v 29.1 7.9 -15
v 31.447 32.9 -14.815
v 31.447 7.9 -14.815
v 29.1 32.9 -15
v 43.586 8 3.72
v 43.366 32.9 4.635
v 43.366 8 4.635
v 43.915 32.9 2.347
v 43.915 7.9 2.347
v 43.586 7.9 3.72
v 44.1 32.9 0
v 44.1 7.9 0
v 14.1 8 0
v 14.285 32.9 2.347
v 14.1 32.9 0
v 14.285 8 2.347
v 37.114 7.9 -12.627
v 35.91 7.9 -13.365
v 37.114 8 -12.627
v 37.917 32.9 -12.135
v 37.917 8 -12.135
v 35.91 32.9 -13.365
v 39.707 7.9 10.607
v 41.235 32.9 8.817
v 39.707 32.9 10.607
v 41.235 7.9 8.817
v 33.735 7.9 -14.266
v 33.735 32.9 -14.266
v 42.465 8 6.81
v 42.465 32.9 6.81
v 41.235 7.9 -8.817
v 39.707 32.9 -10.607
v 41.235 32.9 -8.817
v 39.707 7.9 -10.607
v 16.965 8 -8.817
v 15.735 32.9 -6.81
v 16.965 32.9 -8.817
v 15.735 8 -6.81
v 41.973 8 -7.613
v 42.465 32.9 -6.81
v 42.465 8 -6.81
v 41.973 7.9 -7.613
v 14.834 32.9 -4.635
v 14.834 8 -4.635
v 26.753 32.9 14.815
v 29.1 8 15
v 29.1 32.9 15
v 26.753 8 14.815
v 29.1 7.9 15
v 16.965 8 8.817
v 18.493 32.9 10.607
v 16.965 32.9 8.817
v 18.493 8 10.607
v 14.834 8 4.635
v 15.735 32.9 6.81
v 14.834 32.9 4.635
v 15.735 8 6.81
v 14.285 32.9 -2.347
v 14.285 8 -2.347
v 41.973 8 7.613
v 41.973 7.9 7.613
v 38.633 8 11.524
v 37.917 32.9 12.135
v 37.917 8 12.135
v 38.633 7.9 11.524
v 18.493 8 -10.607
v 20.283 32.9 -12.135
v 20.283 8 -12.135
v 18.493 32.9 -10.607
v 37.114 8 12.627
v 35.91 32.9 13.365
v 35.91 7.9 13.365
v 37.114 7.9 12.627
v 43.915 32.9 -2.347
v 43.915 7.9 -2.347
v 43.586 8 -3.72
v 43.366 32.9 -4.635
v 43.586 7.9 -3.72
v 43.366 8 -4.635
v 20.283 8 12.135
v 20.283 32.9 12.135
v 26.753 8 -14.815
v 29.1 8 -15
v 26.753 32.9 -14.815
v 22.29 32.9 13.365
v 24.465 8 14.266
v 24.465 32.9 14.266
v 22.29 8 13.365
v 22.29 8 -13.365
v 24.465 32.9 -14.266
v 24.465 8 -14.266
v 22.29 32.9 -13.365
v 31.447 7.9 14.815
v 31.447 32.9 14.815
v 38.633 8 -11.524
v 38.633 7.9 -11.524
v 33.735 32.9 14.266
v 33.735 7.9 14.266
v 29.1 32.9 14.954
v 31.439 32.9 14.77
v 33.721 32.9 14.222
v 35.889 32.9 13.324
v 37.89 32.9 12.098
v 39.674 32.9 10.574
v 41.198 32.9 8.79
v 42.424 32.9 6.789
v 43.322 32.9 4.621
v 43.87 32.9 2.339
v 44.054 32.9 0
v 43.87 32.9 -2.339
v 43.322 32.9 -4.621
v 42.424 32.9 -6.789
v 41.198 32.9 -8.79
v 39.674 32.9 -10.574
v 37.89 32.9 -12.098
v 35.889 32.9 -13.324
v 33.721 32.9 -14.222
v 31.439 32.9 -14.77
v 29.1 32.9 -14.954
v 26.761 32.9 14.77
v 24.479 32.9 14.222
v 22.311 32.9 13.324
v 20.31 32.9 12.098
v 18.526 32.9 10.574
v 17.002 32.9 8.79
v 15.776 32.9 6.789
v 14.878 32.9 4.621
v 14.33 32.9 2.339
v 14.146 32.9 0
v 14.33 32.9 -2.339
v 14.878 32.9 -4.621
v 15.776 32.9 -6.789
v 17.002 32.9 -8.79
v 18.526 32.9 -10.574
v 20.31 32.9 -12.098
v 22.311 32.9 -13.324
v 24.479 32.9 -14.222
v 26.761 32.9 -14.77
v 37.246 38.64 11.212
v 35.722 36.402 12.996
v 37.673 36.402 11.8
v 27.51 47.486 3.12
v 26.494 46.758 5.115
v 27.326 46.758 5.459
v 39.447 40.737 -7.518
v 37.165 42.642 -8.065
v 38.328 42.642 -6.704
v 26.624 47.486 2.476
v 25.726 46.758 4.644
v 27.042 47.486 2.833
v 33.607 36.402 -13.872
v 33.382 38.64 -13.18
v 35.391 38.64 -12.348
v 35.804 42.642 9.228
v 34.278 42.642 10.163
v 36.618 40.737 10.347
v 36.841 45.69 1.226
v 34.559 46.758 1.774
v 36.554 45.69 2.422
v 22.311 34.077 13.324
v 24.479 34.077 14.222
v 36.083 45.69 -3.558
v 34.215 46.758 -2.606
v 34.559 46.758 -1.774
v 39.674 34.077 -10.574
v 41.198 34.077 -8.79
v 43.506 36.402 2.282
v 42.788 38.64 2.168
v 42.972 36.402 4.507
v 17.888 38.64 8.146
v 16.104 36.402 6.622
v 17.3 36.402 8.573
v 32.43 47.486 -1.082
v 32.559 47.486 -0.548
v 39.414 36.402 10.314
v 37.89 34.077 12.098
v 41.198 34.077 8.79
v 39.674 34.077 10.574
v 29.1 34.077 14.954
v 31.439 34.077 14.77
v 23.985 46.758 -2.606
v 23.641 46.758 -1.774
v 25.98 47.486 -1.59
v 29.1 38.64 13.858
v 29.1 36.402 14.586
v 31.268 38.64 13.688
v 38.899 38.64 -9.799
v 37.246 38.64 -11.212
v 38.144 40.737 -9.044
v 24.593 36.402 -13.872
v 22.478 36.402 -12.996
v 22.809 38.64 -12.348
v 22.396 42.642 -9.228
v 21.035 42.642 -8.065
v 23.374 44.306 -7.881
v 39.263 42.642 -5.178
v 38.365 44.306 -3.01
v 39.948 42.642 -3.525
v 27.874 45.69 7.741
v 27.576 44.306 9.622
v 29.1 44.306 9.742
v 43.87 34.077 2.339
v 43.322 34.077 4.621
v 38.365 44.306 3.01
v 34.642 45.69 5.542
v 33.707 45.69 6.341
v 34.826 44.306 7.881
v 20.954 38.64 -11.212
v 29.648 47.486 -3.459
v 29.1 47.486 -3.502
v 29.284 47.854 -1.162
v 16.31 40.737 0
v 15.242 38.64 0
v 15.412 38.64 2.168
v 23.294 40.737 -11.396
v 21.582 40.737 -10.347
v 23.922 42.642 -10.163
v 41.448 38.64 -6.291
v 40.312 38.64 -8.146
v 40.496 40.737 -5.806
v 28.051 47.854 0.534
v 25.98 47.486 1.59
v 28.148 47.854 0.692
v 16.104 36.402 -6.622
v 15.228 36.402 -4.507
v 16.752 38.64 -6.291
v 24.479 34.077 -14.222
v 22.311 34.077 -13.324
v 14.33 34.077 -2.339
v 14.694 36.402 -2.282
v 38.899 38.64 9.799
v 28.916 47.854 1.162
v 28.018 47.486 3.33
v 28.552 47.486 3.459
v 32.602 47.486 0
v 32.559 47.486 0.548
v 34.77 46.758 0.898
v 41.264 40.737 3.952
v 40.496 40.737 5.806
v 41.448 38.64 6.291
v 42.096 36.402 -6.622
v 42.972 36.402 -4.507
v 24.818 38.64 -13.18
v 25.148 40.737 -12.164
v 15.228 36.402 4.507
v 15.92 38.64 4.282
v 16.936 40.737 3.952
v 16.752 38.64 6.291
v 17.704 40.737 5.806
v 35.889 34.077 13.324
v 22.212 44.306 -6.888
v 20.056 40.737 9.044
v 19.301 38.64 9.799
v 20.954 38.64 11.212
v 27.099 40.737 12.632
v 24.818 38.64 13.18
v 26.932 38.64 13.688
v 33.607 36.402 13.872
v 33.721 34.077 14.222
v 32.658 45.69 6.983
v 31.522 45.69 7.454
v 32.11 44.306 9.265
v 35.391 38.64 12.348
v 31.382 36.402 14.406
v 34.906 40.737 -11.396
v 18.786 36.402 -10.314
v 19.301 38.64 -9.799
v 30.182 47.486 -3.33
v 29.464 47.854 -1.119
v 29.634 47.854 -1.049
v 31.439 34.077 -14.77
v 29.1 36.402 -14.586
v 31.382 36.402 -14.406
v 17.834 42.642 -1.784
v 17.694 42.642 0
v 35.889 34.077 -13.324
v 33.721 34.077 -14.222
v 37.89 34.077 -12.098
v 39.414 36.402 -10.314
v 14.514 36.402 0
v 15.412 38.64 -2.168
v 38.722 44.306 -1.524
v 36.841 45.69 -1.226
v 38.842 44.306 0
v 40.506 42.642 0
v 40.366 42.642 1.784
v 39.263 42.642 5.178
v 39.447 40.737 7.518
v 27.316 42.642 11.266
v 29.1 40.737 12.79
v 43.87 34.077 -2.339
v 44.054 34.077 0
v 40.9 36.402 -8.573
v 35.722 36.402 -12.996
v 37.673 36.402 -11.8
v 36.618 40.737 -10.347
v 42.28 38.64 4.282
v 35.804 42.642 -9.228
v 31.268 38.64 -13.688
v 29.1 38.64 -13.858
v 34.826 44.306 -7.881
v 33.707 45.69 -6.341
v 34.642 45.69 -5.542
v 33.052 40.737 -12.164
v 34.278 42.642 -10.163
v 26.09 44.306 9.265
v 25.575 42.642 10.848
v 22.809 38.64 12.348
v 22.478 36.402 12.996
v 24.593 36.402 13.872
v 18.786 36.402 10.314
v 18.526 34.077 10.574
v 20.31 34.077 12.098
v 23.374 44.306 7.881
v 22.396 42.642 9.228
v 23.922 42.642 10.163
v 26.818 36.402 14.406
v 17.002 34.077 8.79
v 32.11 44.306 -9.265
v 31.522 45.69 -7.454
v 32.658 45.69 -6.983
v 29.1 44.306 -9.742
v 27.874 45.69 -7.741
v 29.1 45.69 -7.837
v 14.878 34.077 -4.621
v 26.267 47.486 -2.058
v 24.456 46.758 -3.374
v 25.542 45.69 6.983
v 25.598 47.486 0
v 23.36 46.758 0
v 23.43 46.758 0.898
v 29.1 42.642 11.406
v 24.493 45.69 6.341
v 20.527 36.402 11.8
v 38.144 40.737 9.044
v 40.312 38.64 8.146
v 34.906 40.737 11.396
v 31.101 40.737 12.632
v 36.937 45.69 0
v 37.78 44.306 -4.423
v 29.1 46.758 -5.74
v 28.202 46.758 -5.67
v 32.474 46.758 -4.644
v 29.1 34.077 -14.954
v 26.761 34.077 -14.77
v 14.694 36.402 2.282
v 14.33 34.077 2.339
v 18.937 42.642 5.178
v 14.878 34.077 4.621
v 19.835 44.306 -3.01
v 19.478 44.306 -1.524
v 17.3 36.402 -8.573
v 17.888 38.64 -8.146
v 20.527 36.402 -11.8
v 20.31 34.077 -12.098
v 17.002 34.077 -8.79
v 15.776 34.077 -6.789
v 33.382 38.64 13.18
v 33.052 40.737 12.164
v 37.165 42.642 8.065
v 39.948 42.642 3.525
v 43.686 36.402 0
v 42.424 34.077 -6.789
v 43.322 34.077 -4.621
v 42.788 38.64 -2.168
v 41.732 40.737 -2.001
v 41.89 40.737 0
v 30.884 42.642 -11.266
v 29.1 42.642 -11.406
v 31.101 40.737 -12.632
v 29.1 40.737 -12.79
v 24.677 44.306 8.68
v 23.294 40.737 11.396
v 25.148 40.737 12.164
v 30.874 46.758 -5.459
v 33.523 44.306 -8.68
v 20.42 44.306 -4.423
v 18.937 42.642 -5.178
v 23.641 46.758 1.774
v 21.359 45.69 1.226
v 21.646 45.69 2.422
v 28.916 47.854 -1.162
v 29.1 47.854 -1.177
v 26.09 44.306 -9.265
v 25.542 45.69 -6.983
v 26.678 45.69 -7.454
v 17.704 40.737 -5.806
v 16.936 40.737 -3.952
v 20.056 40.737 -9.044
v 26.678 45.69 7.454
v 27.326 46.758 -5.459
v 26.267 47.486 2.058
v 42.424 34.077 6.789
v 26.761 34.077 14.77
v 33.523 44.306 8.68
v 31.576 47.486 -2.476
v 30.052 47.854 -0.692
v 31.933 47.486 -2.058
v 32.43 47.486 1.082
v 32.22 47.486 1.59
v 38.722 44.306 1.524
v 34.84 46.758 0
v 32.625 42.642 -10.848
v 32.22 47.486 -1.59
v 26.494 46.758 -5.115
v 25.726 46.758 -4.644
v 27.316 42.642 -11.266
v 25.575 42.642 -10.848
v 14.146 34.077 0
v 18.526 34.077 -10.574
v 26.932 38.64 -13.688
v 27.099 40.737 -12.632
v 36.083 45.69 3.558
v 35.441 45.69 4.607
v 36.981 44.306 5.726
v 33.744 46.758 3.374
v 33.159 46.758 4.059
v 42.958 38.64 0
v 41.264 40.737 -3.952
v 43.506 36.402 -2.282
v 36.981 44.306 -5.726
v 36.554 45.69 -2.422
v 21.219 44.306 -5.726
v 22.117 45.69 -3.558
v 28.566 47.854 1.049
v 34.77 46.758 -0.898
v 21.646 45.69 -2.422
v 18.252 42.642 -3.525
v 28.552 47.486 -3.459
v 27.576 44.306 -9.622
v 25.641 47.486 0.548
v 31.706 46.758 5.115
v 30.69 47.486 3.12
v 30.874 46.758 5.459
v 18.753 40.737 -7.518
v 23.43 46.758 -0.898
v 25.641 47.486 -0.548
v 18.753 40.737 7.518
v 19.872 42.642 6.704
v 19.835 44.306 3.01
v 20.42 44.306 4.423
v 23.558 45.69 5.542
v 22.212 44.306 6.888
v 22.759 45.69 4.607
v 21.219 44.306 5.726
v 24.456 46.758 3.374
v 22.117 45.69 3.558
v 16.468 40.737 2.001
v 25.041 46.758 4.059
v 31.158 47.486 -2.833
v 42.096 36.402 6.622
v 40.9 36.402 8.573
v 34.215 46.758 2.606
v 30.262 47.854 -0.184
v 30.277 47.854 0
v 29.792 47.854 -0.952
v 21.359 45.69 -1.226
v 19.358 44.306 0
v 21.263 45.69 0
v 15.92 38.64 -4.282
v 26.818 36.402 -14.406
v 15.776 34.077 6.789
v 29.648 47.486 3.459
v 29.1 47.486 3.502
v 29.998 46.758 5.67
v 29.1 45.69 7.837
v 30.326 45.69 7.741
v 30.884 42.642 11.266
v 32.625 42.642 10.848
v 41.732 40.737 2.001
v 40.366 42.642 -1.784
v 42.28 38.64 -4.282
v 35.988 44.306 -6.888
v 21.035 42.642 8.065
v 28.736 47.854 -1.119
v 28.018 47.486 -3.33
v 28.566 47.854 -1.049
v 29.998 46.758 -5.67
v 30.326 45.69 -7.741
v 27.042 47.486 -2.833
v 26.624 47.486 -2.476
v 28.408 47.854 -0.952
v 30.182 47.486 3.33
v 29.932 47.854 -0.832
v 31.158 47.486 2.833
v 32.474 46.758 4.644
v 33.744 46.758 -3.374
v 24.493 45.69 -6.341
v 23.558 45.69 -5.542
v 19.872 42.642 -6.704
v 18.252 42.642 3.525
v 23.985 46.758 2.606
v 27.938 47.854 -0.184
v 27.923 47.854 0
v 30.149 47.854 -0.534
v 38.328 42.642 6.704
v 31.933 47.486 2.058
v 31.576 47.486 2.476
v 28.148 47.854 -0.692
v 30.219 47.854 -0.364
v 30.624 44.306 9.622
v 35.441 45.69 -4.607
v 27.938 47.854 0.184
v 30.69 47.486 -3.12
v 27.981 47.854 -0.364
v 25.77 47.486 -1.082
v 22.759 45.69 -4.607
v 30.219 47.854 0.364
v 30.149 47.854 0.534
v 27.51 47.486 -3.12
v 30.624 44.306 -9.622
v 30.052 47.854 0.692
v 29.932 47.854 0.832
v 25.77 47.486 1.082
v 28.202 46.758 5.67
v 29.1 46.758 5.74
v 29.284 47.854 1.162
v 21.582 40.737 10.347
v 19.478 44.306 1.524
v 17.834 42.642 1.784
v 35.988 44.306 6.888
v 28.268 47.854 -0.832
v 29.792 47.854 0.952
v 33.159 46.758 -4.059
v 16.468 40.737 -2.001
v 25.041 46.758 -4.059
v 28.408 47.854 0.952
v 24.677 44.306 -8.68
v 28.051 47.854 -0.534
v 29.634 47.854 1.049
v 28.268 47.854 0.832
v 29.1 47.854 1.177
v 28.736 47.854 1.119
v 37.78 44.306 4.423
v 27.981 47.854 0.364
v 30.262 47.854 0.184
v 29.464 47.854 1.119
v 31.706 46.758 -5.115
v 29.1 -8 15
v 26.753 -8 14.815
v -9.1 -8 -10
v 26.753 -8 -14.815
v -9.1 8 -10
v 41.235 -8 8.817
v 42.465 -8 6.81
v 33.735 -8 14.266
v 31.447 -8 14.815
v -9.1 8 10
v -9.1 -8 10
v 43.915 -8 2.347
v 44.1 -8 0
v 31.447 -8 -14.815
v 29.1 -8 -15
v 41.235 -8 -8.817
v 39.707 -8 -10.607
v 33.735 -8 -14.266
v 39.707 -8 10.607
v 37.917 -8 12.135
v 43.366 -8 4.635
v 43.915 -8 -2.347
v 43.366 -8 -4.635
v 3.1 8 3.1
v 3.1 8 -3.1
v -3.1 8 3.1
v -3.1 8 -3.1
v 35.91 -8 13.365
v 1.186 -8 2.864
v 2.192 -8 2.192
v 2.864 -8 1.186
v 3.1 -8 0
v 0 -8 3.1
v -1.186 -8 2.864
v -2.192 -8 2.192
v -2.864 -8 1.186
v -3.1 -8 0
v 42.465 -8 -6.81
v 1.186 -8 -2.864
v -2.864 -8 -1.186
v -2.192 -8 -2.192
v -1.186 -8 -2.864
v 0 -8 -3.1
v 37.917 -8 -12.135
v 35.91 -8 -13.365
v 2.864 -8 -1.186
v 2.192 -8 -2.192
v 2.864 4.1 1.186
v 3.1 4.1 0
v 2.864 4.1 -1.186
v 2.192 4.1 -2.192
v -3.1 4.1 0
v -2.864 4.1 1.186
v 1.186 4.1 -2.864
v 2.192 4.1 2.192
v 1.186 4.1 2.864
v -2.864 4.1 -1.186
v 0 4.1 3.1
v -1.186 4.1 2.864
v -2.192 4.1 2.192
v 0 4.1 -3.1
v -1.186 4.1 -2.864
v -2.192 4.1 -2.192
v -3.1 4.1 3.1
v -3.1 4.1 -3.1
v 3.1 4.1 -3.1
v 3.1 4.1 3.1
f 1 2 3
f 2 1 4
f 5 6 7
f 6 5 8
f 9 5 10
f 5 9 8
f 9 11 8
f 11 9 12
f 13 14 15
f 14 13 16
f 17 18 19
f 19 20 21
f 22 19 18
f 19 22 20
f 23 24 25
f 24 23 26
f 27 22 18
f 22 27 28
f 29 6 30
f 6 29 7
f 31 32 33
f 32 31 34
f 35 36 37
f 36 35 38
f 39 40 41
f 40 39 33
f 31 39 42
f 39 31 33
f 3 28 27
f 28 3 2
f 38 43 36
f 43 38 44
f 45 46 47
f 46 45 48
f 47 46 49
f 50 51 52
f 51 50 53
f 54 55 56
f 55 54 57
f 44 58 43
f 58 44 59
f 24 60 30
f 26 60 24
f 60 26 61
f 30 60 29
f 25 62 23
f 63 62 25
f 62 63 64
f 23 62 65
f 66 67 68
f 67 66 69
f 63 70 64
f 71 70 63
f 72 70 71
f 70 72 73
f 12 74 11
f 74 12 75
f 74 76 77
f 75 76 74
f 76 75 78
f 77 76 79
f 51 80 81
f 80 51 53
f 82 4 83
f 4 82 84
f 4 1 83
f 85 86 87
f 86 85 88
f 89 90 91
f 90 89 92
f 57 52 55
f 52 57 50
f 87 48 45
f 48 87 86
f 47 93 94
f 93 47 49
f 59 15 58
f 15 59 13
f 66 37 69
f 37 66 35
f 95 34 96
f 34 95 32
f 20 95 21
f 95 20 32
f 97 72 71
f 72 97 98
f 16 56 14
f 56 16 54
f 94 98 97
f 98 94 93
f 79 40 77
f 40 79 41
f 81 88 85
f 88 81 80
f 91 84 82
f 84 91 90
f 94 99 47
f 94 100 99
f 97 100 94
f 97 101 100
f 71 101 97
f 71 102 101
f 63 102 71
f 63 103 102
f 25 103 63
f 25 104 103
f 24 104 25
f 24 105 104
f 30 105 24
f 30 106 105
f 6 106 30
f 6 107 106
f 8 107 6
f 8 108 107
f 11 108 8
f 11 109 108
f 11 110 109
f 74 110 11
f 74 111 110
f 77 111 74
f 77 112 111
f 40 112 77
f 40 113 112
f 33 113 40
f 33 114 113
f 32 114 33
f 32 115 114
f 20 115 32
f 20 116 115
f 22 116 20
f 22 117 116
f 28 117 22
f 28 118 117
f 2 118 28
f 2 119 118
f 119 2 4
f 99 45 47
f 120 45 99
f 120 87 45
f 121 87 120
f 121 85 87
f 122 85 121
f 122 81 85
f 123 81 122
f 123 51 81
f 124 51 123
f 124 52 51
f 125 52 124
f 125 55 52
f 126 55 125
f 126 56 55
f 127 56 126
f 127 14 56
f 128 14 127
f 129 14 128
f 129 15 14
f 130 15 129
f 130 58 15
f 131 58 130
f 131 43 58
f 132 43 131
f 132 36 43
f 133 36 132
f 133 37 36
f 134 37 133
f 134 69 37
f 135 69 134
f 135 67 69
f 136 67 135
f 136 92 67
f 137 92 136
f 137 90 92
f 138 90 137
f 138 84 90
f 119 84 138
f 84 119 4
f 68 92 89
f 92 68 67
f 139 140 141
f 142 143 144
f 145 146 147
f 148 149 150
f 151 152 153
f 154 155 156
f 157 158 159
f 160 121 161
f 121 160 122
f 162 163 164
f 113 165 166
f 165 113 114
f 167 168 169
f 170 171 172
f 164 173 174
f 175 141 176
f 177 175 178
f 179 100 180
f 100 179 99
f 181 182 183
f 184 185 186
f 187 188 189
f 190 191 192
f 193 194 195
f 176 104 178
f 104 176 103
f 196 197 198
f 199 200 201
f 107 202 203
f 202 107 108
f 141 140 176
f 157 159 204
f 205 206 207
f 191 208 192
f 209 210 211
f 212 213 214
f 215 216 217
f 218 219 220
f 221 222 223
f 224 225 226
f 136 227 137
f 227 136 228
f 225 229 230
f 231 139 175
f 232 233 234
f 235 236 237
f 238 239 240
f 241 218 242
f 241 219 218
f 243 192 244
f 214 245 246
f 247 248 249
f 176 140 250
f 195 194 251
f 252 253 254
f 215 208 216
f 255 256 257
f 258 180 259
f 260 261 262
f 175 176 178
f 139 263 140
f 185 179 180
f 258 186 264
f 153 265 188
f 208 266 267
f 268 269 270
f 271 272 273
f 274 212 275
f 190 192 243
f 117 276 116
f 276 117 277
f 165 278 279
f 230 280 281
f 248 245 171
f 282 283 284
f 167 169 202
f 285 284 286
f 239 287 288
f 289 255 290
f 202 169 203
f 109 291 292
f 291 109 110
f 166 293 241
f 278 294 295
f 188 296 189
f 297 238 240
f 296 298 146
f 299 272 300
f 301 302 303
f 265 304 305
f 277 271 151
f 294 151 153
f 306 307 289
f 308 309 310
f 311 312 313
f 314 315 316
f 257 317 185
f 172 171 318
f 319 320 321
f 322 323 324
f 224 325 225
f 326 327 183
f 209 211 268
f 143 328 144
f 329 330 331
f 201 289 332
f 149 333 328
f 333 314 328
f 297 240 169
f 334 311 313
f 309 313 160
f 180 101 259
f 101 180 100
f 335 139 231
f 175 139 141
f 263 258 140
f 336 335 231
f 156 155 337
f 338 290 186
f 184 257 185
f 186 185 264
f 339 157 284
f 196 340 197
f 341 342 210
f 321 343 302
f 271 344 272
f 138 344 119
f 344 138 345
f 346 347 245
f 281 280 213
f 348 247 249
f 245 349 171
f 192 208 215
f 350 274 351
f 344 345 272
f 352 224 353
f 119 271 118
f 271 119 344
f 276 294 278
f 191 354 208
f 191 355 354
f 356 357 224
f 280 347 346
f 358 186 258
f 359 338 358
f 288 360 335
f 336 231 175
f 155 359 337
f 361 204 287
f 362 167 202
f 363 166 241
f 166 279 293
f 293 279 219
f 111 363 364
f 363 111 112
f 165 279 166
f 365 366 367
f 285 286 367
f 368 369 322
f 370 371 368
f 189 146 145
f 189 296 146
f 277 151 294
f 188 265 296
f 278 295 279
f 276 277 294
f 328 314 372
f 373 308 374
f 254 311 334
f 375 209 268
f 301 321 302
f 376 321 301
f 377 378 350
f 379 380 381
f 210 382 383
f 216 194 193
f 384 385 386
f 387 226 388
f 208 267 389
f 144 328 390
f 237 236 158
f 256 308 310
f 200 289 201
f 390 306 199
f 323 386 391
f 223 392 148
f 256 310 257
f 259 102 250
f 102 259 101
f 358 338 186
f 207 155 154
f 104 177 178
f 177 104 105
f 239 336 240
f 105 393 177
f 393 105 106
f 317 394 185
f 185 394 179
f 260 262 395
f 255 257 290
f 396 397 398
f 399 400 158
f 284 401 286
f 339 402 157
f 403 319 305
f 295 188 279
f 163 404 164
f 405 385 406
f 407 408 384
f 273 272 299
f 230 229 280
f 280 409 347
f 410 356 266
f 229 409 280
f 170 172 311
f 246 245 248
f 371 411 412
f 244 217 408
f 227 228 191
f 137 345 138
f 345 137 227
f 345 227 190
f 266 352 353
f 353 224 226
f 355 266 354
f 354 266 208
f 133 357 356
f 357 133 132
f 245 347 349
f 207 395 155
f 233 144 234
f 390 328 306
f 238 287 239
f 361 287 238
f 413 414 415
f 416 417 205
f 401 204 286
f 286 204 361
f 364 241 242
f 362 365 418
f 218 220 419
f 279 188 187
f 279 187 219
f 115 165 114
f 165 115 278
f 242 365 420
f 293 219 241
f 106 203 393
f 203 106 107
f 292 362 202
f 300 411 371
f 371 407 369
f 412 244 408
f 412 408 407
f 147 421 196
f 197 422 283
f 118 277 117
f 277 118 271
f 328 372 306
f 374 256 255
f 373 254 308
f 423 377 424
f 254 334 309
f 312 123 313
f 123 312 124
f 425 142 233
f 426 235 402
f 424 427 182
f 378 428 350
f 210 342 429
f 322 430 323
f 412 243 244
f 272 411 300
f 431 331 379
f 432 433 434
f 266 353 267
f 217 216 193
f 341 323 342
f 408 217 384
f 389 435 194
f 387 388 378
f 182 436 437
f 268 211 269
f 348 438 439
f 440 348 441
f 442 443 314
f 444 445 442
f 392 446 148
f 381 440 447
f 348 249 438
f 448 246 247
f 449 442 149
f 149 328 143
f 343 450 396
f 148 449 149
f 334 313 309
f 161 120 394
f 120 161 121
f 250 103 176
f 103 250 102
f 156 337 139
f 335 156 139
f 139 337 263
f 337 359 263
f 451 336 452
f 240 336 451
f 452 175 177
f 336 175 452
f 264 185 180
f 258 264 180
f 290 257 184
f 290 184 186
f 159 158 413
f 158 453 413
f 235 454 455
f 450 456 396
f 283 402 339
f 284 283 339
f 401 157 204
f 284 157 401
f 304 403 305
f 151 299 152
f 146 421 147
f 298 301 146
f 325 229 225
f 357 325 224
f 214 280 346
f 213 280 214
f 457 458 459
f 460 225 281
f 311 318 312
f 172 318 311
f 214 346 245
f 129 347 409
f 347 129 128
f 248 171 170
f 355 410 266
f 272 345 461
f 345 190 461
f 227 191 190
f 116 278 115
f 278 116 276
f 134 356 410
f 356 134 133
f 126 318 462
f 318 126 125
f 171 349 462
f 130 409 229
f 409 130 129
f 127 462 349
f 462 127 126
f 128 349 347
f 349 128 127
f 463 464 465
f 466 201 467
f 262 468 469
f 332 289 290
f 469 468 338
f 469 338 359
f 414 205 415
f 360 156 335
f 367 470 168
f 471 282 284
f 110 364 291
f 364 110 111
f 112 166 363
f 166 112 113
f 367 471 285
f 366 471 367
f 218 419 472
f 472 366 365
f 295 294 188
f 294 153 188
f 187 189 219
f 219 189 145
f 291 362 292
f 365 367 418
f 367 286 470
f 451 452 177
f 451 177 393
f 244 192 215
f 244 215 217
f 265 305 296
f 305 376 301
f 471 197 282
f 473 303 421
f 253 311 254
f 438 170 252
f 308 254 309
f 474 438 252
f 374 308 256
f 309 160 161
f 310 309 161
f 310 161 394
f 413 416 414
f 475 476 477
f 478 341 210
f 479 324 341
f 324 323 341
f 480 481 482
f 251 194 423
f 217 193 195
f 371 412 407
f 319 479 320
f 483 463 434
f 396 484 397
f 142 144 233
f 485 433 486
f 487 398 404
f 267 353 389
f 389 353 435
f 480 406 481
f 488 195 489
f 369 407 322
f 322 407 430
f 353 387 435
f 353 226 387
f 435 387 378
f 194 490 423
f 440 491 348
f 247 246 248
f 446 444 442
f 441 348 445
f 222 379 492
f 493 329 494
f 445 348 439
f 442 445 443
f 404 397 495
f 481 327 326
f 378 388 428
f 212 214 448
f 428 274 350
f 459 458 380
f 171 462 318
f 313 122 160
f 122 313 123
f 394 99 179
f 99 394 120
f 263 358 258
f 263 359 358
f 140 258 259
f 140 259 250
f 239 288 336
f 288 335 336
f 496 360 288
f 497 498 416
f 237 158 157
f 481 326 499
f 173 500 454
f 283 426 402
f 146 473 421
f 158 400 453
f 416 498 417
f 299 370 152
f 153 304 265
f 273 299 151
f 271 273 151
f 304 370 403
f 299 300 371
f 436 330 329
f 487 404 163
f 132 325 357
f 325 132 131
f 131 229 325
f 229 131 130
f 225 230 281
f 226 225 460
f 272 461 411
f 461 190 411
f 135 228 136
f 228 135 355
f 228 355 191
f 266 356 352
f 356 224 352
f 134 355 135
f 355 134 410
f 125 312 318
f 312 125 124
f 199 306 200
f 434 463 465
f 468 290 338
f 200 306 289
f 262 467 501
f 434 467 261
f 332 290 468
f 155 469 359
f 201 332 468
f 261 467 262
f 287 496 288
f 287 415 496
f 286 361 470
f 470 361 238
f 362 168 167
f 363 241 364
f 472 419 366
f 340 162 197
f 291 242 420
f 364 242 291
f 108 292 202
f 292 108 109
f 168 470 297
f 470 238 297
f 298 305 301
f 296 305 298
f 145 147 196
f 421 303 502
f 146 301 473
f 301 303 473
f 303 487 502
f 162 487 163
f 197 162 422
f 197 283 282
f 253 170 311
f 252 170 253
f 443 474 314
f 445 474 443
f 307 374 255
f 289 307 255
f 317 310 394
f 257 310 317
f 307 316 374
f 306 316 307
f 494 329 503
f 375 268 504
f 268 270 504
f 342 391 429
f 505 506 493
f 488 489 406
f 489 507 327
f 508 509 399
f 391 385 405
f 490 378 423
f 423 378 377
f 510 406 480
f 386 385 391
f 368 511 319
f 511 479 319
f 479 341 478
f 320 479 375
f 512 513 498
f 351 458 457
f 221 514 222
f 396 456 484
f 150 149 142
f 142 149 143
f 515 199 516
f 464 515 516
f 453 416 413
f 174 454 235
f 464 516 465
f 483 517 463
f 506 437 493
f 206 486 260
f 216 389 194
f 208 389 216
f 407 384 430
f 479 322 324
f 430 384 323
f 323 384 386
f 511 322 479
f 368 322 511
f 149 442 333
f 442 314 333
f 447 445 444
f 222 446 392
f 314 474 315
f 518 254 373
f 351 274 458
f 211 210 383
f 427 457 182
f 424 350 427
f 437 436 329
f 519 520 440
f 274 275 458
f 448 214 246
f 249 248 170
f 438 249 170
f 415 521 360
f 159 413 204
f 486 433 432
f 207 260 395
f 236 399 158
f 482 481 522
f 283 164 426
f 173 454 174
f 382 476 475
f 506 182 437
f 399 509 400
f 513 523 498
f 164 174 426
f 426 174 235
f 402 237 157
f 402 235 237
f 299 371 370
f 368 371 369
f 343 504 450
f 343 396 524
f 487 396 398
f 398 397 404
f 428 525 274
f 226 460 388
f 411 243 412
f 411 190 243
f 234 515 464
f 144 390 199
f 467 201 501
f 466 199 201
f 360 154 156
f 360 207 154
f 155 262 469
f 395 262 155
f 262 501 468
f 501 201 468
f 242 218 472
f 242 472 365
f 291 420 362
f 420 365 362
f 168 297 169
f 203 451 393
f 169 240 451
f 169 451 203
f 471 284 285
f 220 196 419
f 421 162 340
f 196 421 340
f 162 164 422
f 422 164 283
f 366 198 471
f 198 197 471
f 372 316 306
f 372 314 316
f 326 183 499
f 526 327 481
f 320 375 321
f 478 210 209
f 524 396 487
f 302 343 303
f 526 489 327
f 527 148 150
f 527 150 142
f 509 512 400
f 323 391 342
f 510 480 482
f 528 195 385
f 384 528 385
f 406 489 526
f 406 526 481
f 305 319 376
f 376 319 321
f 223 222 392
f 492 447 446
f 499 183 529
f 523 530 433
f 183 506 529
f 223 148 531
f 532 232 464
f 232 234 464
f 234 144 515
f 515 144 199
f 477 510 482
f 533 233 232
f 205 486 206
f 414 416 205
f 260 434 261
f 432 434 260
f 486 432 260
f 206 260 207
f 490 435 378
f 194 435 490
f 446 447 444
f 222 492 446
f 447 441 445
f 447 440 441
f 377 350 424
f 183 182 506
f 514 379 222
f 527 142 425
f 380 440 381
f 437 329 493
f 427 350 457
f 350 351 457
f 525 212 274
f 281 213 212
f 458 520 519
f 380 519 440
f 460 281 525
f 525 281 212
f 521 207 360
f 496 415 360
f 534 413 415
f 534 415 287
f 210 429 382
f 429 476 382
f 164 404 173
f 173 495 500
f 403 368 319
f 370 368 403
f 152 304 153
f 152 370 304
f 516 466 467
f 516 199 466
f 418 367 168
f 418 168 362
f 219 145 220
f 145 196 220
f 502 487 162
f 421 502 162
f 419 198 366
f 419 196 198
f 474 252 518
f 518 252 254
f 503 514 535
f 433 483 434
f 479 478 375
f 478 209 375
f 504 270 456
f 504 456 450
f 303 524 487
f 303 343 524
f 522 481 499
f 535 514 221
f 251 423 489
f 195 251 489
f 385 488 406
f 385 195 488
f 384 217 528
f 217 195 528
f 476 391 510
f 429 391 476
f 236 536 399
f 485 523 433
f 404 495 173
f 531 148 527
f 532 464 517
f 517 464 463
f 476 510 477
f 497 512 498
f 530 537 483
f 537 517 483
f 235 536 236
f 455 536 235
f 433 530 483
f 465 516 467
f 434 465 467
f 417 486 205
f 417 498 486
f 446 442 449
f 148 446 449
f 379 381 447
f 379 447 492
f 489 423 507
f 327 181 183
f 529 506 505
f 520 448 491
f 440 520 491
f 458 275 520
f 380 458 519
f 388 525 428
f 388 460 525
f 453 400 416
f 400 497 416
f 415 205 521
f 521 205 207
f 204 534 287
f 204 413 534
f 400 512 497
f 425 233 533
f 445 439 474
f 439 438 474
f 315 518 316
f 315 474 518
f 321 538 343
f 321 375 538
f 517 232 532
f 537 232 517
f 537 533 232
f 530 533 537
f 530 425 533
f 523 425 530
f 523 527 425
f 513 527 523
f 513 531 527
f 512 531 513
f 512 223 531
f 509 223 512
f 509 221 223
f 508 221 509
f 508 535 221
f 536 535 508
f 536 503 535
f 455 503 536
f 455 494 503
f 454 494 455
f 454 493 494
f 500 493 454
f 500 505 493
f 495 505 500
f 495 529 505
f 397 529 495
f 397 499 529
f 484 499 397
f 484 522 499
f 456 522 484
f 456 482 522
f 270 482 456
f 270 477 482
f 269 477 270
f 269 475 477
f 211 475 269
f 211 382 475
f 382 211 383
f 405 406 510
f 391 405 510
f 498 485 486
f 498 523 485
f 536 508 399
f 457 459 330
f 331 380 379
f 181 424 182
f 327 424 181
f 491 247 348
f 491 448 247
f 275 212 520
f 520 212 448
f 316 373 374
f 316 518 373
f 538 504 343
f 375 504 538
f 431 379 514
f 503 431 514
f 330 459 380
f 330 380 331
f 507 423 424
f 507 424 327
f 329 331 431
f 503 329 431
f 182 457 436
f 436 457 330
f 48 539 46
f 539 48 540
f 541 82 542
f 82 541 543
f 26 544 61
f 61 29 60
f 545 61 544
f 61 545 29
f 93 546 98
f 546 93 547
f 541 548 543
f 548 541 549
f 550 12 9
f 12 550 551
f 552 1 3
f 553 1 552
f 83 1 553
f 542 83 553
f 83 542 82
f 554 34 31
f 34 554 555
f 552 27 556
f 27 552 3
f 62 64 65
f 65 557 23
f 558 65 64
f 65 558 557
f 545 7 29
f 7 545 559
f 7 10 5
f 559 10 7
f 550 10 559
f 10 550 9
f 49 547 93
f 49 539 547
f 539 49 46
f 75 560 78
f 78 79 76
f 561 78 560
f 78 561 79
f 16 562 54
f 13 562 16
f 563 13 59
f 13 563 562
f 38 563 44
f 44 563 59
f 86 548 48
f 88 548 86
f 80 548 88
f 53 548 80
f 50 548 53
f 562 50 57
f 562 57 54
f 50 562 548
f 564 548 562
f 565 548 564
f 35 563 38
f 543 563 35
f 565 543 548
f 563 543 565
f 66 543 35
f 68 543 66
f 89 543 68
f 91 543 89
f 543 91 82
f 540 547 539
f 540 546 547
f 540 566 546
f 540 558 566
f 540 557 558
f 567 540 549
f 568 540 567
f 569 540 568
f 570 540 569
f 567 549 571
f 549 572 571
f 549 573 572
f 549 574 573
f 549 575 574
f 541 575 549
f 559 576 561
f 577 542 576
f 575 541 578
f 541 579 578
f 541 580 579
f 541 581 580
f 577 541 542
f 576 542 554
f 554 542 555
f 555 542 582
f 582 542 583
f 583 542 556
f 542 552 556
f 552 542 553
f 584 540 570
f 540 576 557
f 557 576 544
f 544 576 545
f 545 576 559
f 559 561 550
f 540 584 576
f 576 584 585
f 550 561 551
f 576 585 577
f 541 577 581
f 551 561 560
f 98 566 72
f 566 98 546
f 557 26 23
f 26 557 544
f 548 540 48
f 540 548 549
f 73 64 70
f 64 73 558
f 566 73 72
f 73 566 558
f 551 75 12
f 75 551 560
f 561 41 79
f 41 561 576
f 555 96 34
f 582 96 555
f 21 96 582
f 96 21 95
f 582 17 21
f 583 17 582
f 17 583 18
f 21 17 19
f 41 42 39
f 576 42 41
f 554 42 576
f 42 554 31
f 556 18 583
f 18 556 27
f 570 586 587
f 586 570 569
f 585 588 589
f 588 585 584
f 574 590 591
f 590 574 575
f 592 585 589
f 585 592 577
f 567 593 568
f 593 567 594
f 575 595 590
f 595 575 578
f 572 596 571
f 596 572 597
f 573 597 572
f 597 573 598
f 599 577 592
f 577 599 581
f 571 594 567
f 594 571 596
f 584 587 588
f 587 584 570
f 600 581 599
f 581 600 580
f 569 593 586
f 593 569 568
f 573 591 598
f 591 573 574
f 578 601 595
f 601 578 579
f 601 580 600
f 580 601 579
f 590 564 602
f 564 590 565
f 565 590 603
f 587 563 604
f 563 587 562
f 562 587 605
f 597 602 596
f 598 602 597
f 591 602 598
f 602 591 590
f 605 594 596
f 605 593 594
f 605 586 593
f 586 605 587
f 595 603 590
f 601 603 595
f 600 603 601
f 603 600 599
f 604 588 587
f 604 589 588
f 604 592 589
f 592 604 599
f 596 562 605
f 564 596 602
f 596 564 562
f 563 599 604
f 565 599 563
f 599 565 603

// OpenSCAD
// file: commun.scad
module Tuyau(p_long,p_dext,p_epai) {
 color("LightGray") difference() {
    cylinder(r=p_dext/2,h=p_long,center=true);
    cylinder(r=p_dext/2-p_epai,h=p_long+0.2,center=true);
  }
}
// file: pince.scad
include <commun.scad>;

ecart_vis=100;

diam_arrondi=4;
diam_guidon=34+0.4;
ecar_charniere=54;
larg_charniere=16;
diam_vis=6+0.2; 
prof_encoche=12+diam_vis;
retr_guidon=12;

module Pince_2D() {
  offset(r=diam_arrondi/2) offset(delta=-diam_arrondi/2) difference() {
    hull() {
      translate([-diam_arrondi/2,diam_guidon/2]) circle(r=diam_arrondi/2);
      translate([-diam_arrondi/2,,-diam_guidon/2]) circle(r=diam_arrondi/2);
      translate([diam_guidon/2+(prof_encoche+retr_guidon)/2,0])
        square([prof_encoche+retr_guidon,ecar_charniere+larg_charniere*2],center=true) ;
    }
    circle(r=diam_guidon/2,$fn=60);
    translate([diam_guidon/2+retr_guidon,ecar_charniere/2])
      square([prof_encoche+0.1,larg_charniere+0.1]) ;
    translate([diam_guidon/2+retr_guidon,-ecar_charniere/2-larg_charniere-0.1])
      square([prof_encoche+0.1,larg_charniere+0.1]) ;
  }
}

larg_collier=9+1; epai_collier=1.8+1; retr_collier=3;
haut_pince=larg_collier+10; 


module Pince() {
  intersection() {
    difference() {
      linear_extrude(haut_pince,center=true) Pince_2D();
      scale([1.2,1,1]) Tuyau(larg_collier,diam_guidon+(epai_collier+retr_collier)*2,epai_collier);
      translate([diam_guidon/2+retr_guidon+prof_encoche/2,0,0])
        rotate([90,0,0]) cylinder(r=diam_vis/2,h=ecar_charniere+0.2,center=true,$fn=16);
    }
    union() {
      cube([diam_guidon+retr_guidon*2+prof_encoche,ecar_charniere+larg_charniere*2+0.2,haut_pince+0.2],center=true);
      translate([diam_guidon/2+retr_guidon+prof_encoche-haut_pince/2,0,0])
        rotate([90,0,0]) cylinder(r=haut_pince/2,h=ecar_charniere+larg_charniere*2+0.2,center=true,$fn=40);
    }
  }
}
// file: structure.scad
include <commun.scad>;

diam0_tuyau=16+0.2;

tron_coude=22; retr_coude=diam0_tuyau/2+1;
long_coude=tron_coude+retr_coude*2; epai_coude=1;

long0_cadre=300; long1_cadre=long0_cadre-retr_coude*4;
larg0_cadre=200; larg1_cadre=larg0_cadre-retr_coude*4;
epai_cadre=1;


module Tuyau_Ep1(p_long,p_dext) {
  Tuyau(p_long,p_dext,1);
}


module Coude(p_dint) {
  union() {
    color("LightGray") translate([retr_coude,retr_coude,0])
      rotate_extrude(angle=90) translate([-retr_coude,0,0]) difference() {
        circle(r=p_dint/2+1);
        circle(r=p_dint/2);
      }
    translate([0,tron_coude/2+retr_coude-0.1,0])
      rotate([-90,0,0]) Tuyau_Ep1(tron_coude,p_dint+epai_coude*2);
    translate([tron_coude/2+retr_coude-0.1,0,0])
      rotate([0,90,0]) Tuyau_Ep1(tron_coude,p_dint+epai_coude*2);
    }
}


module _Structure() {
  translate([-larg0_cadre/2+retr_coude,-long0_cadre/2+retr_coude,0]) union() {
    Coude(diam0_tuyau);
    translate([0,long1_cadre/2+retr_coude,0]) rotate([90,0,0]) Tuyau_Ep1(long1_cadre,diam0_tuyau);
    translate([0,long1_cadre+retr_coude*2,0]) rotate([0,0,-90]) Coude(diam0_tuyau);
  }
}


module Structure() {
  union() {
    _Structure();
    mirror([1,0,0]) _Structure();
    translate([0,-long0_cadre/2+retr_coude,0]) rotate([0,90,0]) Tuyau_Ep1(larg1_cadre,diam0_tuyau);
    translate([0,long0_cadre/2-retr_coude,0]) rotate([0,90,0]) Tuyau_Ep1(larg1_cadre,diam0_tuyau);
  }
}
// main file
include <structure.scad>;
include <pince.scad>;

//epai_charniere=4;
espa_charniere=5; prof_carre=4;
diam_teton=30; long0_teton=40; long1_teton=long0_teton-diam_teton/2;

module Teton(carre=false) {
  difference() {
    union() {
      hull() {
        cube([prof_encoche,larg_charniere,haut_pince],center=true);
        translate([(diam_teton+prof_encoche)/2+espa_charniere,0,0])
          rotate([90,0,0]) cylinder(h=larg_charniere,r=diam_teton/2,center=true,$fn=40);
      }
      translate([(diam_teton+prof_encoche)/2+espa_charniere,(long1_teton+larg_charniere)/2-0.1,0]) {
        rotate([90,0,0]) cylinder(h=long1_teton,r=diam_teton/2,center=true,$fn=40);
        translate([0,long1_teton/2,0]) rotate([90,0,0]) sphere(r=diam_teton/2,center=true,$fn=40);
      }
    }
    rotate([90,0,0]) cylinder(r=diam_vis/2,h=larg_charniere+0.2,center=true,$fn=16);
    if (carre)
      translate([0,(larg_charniere-prof_carre)/2+0.1,0] )
        rotate([90,0,0]) cube([diam_vis,diam_vis,prof_carre],center=true);   
  }
}

Teton(true);
